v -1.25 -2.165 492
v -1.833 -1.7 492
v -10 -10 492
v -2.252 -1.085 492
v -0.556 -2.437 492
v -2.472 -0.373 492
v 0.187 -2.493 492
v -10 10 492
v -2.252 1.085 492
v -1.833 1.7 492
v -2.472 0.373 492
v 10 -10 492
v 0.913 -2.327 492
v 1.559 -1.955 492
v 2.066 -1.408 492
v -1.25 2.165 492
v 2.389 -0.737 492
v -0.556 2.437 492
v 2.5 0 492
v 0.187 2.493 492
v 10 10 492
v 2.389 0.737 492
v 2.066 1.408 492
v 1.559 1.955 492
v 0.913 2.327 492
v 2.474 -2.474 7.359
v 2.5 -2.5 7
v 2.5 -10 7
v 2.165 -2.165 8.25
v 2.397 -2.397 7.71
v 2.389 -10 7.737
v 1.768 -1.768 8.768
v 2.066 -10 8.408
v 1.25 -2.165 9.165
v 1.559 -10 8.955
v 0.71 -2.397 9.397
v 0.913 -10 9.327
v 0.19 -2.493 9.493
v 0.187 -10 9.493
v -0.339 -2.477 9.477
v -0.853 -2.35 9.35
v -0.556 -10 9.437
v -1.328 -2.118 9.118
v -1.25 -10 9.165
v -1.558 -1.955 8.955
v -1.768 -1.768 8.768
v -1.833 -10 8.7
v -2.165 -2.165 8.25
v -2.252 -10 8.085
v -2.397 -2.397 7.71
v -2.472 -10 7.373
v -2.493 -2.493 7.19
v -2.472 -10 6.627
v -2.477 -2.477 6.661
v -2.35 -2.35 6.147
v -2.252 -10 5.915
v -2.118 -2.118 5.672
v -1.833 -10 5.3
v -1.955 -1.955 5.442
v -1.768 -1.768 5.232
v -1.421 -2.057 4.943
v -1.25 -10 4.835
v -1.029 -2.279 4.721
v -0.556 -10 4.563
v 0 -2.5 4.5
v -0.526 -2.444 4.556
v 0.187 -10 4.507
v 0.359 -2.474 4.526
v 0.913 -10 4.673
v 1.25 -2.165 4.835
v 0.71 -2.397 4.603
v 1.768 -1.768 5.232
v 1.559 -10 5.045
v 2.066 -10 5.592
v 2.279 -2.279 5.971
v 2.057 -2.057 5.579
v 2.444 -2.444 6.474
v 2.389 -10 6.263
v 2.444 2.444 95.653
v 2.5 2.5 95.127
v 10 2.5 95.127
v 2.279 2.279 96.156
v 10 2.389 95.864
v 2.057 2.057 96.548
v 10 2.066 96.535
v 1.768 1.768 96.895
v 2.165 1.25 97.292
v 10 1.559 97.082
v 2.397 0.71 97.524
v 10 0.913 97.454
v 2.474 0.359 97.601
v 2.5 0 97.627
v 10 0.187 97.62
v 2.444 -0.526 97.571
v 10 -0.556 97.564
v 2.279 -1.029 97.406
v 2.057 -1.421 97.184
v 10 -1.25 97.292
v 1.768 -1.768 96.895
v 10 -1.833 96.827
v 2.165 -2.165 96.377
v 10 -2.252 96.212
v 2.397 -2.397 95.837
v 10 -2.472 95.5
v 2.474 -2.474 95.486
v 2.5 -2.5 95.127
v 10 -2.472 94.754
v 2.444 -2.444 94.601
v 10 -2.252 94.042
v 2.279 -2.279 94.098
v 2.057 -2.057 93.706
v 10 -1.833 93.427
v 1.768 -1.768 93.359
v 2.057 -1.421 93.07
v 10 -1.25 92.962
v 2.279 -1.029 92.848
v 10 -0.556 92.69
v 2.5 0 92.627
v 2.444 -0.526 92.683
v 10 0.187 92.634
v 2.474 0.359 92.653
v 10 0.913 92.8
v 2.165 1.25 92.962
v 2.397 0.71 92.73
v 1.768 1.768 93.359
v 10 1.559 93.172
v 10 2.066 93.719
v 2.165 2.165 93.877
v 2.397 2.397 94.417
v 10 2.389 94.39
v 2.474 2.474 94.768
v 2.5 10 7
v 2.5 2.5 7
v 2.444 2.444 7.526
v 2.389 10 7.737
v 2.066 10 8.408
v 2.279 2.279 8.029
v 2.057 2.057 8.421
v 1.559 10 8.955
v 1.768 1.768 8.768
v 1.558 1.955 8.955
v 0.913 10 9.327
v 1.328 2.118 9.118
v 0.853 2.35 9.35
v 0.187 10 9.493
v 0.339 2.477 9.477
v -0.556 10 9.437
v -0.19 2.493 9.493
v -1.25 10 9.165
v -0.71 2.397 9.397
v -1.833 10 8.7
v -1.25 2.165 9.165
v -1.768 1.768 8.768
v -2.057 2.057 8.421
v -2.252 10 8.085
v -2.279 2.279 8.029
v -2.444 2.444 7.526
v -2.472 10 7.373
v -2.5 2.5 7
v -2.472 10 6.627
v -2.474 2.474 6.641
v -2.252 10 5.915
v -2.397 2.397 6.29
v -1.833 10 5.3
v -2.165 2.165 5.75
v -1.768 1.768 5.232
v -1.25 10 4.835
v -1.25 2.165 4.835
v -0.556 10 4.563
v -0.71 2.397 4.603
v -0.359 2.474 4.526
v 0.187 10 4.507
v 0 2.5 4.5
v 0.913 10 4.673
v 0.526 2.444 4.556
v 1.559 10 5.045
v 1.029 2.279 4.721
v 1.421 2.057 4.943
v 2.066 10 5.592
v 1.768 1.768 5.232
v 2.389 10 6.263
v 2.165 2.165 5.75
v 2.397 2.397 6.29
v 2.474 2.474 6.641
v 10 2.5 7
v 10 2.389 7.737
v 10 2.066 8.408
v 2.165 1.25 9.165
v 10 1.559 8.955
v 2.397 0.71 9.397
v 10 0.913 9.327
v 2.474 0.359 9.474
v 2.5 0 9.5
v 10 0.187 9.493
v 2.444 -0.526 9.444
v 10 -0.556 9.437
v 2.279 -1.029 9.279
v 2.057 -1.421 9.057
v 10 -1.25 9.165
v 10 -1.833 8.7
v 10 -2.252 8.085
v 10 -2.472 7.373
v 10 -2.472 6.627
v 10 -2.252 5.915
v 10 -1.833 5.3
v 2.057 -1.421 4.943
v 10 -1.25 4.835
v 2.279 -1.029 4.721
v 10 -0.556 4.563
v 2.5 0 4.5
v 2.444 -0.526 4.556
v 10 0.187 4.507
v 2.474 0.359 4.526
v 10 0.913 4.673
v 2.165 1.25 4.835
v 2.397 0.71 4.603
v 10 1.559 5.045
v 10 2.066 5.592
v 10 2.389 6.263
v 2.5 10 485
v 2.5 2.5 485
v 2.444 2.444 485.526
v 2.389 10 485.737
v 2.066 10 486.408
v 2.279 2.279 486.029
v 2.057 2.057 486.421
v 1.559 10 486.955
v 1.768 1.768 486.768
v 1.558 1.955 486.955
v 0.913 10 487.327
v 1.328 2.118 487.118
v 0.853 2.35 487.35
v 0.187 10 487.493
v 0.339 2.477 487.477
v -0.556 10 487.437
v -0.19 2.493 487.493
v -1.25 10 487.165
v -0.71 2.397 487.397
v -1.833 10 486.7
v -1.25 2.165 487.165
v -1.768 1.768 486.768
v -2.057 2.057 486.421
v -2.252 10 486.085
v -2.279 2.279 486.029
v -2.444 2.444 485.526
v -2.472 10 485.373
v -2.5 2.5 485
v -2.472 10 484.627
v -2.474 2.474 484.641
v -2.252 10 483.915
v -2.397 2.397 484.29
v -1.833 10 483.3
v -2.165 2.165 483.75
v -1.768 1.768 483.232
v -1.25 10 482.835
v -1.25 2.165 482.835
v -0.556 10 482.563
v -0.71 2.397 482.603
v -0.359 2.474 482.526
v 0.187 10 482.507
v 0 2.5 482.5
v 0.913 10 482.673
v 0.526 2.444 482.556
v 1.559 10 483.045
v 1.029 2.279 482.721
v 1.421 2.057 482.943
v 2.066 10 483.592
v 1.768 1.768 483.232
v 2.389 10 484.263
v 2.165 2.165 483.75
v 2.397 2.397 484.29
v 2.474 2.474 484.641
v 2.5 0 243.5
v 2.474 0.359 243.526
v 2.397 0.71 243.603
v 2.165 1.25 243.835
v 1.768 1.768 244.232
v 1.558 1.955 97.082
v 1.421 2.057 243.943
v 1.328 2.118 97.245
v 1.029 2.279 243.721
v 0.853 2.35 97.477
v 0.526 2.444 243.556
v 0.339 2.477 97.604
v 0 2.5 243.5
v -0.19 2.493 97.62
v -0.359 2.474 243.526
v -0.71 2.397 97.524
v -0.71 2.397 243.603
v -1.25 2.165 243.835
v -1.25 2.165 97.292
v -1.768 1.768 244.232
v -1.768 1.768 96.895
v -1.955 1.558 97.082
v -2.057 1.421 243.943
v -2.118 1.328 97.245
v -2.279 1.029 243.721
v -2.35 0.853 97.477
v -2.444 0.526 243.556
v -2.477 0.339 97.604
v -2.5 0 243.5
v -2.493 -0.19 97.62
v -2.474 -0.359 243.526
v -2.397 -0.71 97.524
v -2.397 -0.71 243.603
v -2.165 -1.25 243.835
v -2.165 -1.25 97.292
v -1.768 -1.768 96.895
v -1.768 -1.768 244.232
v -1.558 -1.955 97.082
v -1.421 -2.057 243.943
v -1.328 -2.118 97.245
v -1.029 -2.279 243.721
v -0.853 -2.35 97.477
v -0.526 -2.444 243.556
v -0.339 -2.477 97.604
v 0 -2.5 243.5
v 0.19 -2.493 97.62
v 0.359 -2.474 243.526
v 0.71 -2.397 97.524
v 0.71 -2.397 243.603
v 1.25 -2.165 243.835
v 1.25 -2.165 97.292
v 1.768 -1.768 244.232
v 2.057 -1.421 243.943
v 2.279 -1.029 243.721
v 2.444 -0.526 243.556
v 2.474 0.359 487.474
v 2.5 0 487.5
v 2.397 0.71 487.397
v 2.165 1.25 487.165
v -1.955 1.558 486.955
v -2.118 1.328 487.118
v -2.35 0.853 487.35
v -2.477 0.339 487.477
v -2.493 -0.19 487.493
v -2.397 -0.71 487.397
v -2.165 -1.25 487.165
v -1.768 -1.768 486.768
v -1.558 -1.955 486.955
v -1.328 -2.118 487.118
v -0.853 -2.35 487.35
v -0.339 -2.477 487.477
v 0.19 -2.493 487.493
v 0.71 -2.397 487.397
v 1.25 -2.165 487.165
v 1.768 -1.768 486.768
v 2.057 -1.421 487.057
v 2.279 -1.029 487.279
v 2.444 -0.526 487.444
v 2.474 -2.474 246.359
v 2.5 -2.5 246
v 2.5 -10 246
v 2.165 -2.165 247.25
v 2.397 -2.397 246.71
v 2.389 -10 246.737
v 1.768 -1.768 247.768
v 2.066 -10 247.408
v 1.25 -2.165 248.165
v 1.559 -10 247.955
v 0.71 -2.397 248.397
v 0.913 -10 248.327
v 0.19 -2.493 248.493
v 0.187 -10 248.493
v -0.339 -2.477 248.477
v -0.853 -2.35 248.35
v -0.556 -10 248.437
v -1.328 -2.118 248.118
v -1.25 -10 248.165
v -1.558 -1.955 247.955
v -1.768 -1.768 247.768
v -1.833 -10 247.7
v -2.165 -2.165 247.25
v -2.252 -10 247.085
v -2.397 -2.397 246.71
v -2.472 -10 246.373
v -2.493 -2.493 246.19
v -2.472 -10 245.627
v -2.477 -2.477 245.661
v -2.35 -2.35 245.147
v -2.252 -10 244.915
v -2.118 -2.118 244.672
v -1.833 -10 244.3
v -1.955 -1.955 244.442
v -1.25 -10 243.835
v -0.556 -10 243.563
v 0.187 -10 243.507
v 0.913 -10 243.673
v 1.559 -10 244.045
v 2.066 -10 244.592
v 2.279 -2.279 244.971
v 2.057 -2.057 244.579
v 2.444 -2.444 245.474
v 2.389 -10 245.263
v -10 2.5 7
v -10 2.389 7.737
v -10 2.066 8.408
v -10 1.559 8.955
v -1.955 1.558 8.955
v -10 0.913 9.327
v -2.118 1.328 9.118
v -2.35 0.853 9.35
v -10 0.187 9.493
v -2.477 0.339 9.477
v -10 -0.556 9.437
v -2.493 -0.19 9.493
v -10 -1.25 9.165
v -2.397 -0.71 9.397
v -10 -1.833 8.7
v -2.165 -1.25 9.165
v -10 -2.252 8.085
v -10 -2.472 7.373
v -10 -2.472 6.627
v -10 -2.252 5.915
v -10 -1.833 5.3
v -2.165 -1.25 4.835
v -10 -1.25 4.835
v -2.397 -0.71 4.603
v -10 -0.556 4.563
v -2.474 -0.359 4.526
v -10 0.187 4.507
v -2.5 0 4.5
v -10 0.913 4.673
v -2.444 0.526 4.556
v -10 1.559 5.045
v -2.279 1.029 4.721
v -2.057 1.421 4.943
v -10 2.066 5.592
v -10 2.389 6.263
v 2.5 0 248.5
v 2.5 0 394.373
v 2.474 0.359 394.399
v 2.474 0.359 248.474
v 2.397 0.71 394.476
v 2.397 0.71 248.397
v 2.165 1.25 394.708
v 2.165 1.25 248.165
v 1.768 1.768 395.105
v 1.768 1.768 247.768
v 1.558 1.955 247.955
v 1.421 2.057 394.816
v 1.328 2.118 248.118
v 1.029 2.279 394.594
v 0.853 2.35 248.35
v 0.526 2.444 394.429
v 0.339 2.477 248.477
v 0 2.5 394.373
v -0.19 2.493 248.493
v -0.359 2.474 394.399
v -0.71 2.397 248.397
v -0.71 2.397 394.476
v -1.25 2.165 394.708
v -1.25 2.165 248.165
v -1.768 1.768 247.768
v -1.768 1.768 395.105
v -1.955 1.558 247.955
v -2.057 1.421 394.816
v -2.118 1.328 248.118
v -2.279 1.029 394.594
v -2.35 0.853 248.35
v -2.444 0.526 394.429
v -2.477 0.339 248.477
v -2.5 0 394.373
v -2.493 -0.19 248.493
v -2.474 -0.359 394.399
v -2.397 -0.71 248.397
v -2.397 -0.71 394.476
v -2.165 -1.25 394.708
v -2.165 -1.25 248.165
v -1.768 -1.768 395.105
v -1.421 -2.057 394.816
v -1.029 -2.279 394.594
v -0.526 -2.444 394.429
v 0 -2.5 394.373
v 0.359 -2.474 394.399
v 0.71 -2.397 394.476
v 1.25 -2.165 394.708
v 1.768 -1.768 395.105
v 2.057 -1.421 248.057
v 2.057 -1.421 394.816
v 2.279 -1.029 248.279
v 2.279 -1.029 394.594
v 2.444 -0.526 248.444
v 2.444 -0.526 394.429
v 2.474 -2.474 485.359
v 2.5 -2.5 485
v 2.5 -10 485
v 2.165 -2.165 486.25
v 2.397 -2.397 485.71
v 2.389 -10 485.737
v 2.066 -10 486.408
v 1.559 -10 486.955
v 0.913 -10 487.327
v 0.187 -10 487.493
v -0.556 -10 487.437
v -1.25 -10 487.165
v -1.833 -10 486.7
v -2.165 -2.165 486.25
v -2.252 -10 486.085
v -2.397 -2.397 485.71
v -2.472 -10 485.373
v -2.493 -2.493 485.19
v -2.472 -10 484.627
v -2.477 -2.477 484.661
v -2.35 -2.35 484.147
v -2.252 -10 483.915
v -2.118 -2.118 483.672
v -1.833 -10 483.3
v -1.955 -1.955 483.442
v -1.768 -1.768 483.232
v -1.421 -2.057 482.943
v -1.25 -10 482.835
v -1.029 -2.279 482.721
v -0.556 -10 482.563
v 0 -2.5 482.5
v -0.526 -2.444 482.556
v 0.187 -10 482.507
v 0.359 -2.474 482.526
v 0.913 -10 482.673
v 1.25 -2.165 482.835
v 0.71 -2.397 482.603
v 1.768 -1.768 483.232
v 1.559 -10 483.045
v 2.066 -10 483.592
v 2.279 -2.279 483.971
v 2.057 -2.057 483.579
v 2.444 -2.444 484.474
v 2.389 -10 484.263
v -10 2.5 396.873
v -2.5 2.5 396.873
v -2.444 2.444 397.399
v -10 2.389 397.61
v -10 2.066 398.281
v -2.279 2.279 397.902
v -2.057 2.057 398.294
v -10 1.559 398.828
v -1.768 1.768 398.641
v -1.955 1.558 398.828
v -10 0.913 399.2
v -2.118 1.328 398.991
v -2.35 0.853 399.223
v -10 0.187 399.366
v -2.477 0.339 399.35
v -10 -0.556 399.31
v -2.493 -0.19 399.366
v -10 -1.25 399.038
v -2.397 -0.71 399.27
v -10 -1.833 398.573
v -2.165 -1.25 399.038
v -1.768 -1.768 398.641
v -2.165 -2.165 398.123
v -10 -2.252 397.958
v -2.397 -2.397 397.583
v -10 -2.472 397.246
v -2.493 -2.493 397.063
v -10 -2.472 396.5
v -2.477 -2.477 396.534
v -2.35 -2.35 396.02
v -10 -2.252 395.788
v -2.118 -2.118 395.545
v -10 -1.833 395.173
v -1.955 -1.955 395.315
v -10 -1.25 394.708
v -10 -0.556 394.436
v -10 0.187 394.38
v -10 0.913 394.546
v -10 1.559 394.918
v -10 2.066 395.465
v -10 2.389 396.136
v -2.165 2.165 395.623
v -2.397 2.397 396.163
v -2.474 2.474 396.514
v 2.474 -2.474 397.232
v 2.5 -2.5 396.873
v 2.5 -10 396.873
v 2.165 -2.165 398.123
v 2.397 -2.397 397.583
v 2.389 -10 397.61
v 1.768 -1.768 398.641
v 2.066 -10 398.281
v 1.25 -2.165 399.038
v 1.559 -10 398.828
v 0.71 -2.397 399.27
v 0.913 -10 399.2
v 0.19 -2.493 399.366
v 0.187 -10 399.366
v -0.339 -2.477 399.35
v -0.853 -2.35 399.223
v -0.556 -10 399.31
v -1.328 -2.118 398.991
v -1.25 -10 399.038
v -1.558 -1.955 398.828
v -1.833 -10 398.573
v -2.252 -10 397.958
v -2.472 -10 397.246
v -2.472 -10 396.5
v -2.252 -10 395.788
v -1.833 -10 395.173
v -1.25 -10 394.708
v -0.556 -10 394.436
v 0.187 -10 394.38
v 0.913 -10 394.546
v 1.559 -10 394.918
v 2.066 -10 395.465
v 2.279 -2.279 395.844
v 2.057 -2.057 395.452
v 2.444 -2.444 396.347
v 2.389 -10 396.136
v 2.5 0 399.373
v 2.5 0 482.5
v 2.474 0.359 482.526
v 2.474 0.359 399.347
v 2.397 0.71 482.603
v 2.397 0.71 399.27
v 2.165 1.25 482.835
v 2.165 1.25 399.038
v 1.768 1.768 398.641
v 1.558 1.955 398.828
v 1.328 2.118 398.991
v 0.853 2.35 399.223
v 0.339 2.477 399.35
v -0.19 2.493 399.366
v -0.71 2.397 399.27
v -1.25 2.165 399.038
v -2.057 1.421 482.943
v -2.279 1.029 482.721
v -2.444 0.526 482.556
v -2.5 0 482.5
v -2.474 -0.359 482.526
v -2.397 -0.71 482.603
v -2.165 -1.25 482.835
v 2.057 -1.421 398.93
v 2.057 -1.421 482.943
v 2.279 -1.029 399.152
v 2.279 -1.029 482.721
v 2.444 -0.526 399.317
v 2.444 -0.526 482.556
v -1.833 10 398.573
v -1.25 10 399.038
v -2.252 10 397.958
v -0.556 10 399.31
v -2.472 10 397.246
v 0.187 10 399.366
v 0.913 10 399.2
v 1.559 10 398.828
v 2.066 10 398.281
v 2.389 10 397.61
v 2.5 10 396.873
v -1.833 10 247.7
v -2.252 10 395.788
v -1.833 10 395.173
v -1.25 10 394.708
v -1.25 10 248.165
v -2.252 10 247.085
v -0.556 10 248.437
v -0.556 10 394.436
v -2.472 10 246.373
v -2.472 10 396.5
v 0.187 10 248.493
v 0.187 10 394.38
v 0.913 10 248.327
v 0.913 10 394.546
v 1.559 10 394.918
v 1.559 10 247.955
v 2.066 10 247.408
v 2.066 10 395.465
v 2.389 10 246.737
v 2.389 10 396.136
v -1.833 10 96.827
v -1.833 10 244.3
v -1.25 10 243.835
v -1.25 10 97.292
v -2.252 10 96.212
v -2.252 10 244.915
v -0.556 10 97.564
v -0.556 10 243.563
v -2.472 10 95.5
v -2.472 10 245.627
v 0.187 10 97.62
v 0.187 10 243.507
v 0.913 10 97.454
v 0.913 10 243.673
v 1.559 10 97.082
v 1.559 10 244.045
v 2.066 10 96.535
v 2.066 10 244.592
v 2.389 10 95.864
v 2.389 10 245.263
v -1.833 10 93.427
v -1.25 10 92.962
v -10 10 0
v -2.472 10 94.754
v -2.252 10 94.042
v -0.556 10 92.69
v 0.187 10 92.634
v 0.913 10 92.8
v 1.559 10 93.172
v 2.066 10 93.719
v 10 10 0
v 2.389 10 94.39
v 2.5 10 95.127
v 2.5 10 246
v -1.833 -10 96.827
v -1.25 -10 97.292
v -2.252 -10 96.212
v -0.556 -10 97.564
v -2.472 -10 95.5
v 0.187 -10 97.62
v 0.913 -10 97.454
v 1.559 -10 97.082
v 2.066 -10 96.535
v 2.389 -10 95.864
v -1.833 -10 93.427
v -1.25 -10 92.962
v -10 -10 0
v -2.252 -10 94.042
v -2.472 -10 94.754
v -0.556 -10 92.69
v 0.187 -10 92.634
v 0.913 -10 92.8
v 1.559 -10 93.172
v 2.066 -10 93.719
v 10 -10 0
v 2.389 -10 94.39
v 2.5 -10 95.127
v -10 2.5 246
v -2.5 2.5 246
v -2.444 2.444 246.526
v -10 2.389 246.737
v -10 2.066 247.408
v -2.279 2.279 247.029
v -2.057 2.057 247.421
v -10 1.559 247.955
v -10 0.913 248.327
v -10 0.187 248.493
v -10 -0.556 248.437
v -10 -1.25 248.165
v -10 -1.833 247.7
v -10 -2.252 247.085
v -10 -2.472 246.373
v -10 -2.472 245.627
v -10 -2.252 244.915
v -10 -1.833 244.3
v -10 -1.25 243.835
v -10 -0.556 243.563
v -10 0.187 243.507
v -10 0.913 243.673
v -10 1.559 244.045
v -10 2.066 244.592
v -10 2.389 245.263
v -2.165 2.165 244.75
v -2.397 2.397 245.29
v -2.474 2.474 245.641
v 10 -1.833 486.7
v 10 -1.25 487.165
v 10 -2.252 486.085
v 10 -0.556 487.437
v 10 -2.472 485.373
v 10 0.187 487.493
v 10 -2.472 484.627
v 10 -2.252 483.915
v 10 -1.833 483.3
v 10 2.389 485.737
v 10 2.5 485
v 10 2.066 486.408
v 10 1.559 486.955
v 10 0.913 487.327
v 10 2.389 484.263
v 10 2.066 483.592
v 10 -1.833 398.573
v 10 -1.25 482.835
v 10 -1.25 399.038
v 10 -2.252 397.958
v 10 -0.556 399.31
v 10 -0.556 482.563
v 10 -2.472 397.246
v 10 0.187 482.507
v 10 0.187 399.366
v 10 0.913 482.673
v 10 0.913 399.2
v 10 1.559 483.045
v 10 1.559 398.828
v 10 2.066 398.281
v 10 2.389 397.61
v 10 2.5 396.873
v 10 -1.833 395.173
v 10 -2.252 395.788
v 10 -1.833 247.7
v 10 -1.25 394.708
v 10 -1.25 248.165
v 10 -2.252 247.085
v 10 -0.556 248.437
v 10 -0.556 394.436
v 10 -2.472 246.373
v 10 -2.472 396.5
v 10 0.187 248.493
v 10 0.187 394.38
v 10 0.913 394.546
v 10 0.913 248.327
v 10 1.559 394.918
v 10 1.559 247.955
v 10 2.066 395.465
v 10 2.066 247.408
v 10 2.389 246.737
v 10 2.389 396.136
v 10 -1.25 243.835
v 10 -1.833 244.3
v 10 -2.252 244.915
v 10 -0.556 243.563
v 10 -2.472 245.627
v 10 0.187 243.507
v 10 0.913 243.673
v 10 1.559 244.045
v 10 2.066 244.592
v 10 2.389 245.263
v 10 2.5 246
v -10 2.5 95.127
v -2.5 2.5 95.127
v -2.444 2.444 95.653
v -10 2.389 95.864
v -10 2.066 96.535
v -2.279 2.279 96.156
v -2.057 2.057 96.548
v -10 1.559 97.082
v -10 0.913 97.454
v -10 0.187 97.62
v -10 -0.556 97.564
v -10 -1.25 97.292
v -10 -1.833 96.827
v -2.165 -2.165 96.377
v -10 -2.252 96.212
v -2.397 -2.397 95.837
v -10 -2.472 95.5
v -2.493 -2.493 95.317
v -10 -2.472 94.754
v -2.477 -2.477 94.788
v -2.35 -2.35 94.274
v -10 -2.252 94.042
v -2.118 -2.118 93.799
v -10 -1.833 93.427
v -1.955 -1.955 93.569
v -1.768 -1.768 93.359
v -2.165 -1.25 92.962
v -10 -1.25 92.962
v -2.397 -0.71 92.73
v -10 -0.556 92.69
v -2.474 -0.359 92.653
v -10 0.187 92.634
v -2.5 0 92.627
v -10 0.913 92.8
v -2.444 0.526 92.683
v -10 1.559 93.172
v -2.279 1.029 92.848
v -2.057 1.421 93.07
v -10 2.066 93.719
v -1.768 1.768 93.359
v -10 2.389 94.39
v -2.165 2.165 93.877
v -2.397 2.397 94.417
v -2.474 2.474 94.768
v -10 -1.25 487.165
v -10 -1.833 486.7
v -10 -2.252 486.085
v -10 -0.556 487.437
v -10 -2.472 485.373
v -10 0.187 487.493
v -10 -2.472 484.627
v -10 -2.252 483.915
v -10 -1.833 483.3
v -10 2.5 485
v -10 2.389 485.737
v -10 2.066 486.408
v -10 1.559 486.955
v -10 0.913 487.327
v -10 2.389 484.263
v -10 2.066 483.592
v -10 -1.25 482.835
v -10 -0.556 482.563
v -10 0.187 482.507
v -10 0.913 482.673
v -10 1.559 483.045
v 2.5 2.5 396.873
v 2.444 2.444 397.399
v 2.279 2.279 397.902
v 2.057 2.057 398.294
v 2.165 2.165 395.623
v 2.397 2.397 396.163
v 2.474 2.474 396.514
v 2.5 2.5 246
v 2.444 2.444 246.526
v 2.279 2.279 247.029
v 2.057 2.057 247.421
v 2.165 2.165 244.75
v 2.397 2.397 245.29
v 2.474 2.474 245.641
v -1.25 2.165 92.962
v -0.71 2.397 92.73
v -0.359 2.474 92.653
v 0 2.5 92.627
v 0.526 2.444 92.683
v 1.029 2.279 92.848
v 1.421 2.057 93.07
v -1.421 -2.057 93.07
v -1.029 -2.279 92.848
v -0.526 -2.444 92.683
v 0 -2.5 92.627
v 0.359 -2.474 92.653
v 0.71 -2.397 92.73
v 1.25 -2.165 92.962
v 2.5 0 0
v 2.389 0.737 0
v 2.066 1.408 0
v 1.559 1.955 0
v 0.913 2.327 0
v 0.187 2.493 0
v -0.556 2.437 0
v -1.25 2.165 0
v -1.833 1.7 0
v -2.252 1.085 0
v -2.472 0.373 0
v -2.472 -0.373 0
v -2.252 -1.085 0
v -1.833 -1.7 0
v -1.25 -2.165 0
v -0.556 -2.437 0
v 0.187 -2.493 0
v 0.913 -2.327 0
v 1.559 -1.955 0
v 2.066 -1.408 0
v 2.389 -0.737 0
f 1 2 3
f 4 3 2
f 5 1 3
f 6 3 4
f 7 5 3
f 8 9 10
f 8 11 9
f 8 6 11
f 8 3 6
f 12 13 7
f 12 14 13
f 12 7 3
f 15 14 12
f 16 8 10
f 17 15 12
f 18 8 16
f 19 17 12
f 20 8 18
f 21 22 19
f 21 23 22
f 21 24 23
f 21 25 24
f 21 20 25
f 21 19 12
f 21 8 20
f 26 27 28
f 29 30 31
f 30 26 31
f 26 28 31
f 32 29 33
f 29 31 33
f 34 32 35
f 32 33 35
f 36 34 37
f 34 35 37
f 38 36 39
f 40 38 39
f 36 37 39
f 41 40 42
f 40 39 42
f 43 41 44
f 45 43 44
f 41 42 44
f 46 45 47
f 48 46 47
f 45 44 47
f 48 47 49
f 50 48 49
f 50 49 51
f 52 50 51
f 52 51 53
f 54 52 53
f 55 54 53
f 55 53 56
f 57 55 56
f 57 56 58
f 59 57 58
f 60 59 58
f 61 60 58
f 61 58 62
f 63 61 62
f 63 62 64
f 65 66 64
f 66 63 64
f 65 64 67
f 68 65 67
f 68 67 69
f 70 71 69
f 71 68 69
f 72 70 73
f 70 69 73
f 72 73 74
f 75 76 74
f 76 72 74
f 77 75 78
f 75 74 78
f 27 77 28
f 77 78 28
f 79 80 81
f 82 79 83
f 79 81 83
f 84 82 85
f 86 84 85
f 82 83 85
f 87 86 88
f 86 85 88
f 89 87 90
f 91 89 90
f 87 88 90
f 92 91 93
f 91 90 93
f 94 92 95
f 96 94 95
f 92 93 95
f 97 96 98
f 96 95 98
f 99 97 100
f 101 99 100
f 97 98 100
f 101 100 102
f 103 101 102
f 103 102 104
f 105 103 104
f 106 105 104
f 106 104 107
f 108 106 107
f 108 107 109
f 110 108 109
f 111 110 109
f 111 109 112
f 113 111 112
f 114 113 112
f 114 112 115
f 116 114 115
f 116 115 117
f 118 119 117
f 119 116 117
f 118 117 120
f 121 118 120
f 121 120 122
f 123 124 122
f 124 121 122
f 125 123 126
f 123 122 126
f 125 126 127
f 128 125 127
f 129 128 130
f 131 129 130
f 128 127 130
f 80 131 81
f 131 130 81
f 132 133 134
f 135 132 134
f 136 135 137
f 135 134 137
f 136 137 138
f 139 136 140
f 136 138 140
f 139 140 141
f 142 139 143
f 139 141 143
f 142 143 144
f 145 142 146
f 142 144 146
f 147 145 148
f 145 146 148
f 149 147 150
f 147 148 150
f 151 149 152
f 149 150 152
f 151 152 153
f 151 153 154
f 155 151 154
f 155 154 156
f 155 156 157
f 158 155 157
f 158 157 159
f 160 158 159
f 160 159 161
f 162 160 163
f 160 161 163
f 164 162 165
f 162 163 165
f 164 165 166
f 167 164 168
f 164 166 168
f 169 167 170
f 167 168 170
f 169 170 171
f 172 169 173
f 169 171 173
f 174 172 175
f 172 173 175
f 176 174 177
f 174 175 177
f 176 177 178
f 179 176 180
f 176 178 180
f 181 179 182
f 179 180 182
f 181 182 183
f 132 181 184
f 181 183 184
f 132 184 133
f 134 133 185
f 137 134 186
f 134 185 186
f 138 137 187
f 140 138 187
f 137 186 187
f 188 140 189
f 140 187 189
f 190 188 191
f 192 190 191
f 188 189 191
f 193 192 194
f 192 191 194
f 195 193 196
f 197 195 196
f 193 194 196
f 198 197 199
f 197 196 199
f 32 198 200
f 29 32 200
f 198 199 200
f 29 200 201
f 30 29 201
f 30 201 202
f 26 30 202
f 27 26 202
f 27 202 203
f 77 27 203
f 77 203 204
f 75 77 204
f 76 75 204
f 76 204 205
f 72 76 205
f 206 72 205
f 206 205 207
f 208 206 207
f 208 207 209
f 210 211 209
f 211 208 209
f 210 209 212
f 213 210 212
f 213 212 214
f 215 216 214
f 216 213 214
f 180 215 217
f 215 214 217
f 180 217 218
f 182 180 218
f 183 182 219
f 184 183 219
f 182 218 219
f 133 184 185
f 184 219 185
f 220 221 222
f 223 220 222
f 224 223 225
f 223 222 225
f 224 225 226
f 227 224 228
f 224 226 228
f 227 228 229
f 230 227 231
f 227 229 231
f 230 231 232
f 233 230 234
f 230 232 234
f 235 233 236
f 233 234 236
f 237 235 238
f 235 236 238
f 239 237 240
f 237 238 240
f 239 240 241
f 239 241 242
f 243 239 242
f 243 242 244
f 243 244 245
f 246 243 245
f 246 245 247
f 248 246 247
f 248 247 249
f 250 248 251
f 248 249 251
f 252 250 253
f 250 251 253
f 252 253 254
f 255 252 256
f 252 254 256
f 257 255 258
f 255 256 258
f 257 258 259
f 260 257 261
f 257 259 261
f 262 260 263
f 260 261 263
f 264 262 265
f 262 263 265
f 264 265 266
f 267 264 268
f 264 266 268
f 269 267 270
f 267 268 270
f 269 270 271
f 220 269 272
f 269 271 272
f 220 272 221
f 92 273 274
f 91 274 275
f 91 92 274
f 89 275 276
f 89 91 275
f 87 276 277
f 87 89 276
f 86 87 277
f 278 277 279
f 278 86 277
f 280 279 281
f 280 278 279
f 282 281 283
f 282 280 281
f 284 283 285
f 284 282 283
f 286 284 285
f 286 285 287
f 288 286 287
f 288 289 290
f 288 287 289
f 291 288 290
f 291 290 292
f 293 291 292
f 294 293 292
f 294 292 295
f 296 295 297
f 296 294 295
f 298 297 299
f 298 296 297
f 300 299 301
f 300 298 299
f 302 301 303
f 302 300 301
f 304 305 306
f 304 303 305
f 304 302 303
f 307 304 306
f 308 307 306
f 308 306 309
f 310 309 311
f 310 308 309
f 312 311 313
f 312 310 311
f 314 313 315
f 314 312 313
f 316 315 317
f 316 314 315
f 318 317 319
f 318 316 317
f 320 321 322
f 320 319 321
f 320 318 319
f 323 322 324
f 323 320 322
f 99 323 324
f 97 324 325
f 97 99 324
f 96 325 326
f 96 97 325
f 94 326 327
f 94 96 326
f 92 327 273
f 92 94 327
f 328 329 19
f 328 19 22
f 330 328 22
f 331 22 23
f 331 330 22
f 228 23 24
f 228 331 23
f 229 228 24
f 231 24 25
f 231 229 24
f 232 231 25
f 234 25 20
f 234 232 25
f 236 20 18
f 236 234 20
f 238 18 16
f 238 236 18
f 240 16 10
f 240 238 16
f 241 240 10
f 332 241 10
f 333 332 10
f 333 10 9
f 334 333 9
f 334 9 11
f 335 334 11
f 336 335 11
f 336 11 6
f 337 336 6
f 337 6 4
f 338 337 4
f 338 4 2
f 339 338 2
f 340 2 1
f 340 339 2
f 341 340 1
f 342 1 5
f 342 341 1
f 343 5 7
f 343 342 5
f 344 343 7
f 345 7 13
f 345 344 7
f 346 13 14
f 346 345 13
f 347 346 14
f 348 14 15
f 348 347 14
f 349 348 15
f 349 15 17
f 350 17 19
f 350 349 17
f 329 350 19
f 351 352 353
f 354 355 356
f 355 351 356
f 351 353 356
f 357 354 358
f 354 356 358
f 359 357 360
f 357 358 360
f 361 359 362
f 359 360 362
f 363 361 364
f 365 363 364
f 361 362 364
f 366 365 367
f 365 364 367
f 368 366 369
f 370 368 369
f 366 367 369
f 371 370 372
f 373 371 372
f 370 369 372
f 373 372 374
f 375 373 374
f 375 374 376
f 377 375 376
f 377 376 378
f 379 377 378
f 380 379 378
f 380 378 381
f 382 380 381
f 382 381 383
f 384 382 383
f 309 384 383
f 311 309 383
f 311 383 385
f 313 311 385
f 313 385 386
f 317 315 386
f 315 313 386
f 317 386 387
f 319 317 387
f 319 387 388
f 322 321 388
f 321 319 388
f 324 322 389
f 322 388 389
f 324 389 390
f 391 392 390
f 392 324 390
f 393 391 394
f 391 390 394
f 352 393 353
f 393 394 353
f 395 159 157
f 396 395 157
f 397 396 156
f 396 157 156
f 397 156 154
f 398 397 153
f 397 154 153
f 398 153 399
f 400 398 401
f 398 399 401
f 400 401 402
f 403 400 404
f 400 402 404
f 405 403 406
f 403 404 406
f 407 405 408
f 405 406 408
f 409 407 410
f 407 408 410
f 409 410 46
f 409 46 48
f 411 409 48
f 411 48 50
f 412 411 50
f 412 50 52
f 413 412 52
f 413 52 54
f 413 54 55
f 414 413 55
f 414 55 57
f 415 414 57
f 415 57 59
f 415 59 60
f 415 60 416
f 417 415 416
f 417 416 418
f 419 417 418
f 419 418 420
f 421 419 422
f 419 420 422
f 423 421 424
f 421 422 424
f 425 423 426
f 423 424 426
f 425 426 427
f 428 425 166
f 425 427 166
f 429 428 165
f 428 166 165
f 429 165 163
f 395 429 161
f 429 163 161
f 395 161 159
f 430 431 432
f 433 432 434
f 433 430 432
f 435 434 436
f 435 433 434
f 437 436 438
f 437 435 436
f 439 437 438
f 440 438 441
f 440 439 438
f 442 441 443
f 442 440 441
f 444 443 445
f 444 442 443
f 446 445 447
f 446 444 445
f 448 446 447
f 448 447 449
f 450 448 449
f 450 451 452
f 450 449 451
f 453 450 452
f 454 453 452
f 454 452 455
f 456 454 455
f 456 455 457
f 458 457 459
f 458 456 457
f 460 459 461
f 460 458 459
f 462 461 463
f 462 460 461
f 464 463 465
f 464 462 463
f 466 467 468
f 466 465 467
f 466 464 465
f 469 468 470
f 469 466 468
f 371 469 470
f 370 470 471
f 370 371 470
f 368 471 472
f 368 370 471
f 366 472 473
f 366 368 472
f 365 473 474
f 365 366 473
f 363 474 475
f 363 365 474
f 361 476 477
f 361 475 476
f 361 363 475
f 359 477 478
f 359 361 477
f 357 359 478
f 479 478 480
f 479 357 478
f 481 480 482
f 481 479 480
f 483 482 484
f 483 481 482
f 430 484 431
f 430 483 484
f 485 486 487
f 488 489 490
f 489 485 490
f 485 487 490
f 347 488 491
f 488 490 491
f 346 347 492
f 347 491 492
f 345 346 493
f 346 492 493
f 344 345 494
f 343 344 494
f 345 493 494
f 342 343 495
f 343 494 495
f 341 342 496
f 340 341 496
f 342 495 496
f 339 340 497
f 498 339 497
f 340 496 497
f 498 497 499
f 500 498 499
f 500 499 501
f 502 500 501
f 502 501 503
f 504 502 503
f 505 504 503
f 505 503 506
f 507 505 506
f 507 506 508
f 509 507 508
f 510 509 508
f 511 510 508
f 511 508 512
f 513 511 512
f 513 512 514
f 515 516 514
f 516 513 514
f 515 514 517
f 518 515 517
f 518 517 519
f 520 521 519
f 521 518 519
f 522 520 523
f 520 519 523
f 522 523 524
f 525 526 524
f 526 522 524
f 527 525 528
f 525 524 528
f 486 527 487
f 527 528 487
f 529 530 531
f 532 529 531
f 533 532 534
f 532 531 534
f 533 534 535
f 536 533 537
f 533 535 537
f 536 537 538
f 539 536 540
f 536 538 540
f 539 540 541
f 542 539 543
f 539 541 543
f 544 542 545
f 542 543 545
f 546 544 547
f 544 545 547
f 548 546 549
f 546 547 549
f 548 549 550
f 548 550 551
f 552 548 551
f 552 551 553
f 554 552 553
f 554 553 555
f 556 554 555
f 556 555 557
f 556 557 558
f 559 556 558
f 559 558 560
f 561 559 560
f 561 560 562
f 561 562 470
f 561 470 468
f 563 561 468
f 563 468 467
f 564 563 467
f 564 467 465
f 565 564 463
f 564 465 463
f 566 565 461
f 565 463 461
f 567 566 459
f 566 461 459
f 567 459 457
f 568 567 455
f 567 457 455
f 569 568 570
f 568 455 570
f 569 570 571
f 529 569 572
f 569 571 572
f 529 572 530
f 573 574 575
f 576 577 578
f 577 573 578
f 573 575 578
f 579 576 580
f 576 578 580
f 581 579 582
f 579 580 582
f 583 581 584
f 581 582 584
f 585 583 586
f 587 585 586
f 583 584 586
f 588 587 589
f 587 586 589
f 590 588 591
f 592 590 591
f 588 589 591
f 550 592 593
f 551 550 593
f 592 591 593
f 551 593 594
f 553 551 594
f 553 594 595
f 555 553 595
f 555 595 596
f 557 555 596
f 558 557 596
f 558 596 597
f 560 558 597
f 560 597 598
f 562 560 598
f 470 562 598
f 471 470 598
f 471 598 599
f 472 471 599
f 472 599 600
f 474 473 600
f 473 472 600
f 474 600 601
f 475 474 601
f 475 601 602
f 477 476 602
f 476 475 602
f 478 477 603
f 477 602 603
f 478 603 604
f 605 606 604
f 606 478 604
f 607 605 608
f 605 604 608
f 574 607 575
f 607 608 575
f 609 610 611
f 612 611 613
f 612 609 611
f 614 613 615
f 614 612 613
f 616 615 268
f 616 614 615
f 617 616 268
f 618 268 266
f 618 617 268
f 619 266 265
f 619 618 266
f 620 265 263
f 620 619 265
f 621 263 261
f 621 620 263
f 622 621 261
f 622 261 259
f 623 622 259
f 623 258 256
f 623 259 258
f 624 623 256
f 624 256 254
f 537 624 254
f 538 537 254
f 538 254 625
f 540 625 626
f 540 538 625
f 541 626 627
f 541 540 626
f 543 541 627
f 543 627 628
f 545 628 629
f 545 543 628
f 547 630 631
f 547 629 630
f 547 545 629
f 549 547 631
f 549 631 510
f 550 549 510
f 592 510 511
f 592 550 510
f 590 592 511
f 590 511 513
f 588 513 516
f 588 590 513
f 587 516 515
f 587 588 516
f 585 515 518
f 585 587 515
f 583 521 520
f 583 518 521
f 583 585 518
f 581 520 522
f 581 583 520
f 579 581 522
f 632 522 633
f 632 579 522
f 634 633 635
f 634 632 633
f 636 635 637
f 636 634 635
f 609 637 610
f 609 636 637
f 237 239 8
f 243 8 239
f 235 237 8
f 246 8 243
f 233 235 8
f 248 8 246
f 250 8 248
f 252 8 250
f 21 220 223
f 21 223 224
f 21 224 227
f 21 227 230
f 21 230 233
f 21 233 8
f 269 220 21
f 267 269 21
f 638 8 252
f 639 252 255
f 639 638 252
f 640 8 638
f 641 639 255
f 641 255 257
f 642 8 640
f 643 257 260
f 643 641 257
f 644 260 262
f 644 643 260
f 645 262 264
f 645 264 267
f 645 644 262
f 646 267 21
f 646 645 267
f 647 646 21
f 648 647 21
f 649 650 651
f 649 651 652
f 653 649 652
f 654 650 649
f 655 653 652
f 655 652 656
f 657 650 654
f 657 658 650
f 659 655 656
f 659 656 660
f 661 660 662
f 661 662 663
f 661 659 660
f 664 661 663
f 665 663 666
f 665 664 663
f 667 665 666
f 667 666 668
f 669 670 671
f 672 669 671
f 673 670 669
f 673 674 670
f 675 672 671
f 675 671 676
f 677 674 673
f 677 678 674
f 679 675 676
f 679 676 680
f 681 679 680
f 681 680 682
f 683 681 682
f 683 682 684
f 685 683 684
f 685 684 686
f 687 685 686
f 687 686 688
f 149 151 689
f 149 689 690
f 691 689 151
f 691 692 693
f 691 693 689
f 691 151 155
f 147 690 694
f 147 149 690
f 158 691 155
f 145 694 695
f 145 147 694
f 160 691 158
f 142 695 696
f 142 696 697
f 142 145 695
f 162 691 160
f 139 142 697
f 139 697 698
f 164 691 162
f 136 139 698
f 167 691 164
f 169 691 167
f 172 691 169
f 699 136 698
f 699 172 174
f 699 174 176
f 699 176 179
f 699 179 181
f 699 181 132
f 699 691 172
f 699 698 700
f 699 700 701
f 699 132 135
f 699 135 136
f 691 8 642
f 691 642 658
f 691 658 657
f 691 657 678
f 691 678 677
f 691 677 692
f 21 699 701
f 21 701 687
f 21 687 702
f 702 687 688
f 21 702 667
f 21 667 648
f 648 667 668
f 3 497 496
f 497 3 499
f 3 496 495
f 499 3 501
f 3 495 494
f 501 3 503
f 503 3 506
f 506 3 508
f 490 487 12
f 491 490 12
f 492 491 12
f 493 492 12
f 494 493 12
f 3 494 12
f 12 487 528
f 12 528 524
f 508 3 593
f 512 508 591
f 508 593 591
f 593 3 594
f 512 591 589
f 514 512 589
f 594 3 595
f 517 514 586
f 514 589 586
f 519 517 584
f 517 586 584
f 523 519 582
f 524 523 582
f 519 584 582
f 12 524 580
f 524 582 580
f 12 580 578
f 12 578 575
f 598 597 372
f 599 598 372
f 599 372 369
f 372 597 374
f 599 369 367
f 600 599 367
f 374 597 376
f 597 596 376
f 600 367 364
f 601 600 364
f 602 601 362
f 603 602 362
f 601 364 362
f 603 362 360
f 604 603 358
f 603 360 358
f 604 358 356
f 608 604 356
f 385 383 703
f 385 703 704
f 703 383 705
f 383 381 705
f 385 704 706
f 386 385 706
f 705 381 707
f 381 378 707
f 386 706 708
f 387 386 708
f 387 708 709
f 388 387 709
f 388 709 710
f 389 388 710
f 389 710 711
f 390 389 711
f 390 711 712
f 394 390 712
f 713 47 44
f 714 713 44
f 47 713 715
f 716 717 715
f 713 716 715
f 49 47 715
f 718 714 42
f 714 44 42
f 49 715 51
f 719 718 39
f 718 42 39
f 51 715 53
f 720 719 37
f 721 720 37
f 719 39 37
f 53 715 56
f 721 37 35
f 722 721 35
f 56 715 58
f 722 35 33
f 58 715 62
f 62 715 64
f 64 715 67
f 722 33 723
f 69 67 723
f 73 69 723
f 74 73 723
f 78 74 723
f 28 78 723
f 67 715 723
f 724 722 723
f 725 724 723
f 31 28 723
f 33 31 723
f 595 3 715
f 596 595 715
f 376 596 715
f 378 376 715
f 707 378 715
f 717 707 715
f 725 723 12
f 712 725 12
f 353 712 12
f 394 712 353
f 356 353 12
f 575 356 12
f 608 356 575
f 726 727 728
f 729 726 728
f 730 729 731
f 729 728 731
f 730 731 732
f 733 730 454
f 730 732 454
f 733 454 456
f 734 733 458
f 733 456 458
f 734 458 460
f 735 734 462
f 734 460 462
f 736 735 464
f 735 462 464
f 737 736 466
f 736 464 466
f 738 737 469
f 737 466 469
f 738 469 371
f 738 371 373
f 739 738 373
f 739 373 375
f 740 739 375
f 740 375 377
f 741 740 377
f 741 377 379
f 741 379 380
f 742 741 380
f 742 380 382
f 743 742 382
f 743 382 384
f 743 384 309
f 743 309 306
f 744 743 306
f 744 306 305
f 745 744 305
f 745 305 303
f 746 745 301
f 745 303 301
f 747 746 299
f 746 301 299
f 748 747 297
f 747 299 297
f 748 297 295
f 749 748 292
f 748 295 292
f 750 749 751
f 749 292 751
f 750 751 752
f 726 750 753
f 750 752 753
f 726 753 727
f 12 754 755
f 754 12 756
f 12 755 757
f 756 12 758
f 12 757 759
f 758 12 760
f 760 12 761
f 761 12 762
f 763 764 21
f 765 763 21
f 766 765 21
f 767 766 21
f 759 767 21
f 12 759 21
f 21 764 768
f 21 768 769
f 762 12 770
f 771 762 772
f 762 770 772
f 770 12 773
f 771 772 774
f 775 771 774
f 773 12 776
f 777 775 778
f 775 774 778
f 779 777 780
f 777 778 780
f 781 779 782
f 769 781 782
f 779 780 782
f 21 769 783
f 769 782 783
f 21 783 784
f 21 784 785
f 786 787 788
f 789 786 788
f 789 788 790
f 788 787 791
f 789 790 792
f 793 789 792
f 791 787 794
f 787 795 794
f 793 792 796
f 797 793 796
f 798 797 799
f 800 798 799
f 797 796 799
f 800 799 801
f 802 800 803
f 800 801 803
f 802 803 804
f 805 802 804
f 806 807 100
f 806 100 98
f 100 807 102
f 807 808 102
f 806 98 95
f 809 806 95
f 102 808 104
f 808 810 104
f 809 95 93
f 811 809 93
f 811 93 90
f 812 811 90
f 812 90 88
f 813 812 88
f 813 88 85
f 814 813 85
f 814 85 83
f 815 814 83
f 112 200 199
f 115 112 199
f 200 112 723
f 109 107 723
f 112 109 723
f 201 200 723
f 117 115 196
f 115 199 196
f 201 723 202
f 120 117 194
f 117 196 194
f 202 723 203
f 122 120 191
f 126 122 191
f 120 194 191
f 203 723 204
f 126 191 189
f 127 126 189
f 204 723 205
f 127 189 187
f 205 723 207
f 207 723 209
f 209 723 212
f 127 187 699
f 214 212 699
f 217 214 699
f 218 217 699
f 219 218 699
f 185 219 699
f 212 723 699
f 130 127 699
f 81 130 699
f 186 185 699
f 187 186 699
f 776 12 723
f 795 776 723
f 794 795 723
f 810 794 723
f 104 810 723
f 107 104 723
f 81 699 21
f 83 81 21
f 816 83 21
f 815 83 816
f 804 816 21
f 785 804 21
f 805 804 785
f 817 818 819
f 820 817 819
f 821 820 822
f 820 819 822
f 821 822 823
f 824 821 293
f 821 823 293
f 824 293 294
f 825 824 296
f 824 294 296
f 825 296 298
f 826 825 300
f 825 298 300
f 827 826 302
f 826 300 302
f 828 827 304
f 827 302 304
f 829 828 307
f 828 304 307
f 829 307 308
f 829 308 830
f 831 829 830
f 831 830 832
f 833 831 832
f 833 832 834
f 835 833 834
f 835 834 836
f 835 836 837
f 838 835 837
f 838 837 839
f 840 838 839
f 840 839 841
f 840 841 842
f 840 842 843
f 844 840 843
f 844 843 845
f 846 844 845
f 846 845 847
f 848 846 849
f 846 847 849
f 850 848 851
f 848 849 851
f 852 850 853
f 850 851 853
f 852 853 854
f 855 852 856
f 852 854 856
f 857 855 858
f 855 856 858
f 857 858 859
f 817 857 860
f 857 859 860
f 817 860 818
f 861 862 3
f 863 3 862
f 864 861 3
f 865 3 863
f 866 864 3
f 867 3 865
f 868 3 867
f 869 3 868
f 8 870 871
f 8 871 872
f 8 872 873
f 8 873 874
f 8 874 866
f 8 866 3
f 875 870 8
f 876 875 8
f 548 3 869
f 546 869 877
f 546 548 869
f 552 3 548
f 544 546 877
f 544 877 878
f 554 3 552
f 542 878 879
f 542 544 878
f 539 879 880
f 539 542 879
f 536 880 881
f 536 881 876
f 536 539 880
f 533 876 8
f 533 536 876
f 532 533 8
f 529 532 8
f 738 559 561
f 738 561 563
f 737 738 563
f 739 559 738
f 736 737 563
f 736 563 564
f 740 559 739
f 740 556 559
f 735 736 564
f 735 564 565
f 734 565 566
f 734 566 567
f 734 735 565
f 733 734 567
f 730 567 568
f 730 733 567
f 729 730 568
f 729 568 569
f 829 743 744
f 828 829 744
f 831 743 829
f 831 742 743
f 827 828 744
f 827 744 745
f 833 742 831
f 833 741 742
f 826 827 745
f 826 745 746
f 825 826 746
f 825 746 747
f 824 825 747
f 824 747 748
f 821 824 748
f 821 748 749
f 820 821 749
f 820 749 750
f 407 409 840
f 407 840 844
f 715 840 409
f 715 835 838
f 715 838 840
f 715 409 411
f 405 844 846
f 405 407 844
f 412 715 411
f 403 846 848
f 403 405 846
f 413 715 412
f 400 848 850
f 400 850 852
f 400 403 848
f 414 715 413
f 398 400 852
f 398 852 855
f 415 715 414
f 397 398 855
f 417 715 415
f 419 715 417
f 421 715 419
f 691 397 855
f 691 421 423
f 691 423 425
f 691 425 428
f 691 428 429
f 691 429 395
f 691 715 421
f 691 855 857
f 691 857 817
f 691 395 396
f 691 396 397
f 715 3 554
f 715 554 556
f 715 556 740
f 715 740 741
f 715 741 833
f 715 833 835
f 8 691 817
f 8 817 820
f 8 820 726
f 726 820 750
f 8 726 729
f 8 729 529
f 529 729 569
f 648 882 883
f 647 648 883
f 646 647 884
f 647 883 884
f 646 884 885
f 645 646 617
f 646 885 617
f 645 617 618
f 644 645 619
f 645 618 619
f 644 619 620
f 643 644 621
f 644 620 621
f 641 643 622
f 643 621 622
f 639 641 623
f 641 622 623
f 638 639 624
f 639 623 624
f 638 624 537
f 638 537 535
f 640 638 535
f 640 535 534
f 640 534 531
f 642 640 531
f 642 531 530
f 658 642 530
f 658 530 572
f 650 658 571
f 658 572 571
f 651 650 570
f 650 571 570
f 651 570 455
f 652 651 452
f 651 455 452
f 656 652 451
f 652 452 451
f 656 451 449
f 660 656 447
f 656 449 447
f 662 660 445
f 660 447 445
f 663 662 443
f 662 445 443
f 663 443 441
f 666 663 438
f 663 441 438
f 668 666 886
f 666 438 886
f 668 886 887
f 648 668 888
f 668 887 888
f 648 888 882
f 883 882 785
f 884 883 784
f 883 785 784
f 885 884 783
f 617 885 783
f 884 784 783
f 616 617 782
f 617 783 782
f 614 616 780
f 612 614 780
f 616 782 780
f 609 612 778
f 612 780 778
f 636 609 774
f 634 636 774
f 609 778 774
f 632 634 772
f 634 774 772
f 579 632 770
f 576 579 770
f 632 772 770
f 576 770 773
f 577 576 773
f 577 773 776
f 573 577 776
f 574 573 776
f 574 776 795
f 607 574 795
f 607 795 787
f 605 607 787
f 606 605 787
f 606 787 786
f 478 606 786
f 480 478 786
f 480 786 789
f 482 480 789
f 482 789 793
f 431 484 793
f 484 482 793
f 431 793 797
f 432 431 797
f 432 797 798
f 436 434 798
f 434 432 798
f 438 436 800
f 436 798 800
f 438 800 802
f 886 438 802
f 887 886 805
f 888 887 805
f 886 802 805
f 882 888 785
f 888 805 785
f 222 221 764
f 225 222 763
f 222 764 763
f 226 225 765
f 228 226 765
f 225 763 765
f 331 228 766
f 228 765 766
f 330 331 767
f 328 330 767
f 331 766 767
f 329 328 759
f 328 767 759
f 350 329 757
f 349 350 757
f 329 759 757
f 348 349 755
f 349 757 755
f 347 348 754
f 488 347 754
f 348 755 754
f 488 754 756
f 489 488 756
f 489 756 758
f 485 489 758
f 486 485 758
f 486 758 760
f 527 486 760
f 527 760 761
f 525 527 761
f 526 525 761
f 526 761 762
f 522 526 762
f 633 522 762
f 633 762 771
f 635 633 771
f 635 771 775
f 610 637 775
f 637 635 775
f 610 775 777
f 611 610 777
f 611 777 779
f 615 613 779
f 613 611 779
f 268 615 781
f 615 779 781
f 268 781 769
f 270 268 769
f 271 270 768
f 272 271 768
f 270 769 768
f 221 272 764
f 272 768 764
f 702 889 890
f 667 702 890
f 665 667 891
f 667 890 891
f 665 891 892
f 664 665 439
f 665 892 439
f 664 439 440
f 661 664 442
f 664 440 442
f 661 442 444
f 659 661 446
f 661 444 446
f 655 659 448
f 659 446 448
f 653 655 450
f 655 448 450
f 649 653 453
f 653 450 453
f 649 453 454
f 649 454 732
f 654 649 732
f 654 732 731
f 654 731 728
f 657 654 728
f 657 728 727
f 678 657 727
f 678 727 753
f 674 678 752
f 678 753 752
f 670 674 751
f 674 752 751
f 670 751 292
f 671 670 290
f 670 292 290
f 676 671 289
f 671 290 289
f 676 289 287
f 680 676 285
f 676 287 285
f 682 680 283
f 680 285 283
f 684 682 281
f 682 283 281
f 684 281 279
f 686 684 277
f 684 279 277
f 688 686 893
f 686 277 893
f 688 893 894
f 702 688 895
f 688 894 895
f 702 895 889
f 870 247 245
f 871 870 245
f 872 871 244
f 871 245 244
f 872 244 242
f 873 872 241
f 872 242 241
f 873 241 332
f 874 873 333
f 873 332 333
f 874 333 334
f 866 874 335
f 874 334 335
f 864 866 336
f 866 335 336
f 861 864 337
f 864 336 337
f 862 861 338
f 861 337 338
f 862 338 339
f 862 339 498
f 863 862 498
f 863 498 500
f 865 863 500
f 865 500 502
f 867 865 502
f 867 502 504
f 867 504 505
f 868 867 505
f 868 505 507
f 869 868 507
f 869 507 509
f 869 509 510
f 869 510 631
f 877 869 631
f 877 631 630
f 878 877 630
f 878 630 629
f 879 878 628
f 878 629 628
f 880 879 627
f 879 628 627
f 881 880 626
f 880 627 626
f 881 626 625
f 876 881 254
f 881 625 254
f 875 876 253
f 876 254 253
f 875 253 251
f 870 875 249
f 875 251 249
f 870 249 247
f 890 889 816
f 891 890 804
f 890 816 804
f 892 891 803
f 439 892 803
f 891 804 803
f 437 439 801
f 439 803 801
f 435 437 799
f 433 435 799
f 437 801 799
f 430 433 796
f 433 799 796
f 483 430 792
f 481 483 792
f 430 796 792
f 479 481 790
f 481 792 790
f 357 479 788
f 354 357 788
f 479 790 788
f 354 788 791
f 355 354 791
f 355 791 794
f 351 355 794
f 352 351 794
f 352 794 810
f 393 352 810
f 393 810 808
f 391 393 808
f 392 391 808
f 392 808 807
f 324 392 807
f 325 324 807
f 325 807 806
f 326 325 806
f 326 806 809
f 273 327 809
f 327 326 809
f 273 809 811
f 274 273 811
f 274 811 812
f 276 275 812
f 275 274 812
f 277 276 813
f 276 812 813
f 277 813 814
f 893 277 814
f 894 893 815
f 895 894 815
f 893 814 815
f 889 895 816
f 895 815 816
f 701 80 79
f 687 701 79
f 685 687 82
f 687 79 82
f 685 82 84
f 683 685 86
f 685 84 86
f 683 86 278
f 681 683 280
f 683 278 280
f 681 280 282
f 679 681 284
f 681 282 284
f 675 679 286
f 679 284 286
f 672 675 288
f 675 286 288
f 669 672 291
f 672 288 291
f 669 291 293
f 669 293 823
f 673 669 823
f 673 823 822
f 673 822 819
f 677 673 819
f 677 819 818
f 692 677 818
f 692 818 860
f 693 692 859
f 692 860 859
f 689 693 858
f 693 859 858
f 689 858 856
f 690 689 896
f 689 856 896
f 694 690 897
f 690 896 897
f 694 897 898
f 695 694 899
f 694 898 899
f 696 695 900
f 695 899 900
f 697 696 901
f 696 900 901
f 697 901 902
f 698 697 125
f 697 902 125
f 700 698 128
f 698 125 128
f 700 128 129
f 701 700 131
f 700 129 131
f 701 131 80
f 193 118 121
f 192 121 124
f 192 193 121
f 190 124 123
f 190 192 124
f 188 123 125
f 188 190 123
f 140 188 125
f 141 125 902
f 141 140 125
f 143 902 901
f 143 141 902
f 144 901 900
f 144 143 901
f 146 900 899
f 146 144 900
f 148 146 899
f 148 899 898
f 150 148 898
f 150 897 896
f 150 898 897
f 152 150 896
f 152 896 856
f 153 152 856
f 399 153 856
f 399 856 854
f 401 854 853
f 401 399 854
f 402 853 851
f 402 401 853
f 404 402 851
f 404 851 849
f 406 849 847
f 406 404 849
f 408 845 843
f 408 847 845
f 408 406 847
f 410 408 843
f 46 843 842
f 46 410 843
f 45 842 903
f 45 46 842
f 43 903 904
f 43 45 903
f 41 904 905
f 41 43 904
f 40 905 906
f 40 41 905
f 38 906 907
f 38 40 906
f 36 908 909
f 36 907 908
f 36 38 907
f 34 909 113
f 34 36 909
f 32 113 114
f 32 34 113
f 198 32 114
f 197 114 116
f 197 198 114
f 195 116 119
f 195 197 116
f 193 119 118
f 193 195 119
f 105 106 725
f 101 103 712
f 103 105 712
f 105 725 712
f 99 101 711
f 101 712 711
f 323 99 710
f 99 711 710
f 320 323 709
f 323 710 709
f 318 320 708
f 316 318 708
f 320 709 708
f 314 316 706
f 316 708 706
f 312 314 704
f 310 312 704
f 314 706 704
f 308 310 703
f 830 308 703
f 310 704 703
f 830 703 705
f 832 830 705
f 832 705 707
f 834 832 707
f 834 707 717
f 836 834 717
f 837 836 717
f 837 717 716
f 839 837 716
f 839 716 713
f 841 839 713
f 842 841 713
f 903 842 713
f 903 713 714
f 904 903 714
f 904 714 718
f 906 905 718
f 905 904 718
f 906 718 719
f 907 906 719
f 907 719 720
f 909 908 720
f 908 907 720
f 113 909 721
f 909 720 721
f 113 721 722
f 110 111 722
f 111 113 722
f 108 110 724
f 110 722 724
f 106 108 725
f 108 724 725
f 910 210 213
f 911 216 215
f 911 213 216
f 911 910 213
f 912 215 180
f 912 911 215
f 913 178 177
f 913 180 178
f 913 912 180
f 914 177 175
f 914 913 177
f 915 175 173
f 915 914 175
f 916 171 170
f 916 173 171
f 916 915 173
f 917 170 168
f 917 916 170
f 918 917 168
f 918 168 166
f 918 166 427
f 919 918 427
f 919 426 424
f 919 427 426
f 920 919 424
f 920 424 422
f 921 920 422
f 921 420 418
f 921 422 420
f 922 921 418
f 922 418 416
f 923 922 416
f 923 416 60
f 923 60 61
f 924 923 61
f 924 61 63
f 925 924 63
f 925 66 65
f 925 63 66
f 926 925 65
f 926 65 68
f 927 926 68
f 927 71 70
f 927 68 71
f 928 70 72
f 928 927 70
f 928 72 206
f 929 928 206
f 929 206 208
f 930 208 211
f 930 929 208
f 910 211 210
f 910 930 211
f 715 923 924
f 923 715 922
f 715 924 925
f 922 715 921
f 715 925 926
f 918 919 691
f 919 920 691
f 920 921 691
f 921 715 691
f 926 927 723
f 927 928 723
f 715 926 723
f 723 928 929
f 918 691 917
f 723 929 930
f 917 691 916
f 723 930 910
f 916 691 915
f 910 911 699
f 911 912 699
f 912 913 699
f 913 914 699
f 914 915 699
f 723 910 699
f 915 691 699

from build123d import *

# Parameters (mm, degrees)
F0_W     = 20
F0_H     = 20
F0_R     = 2.5
F1_DEPTH = 492
F2_R     = 2.5
F3_DEPTH = 20.001
F4_R     = 2.5
F5_DEPTH = 20.001


with BuildPart() as f1:
    # F0 (on Top) → F1 (new body)
    with BuildSketch(Plane.XY):
        Rectangle(F0_W, F0_H)
        Circle(F0_R, mode=Mode.SUBTRACT)
    extrude(amount=F1_DEPTH)

    # F2 (on face) → F3 (cut, through all)
    with BuildSketch(Plane.YZ.offset(10)):
        with Locations((0, 7)):
            Circle(F2_R)
        with Locations((0, 485)):
            Circle(F2_R)
        with Locations((0, 246)):
            Circle(F2_R)
        with Locations((0, 95.127)):
            Circle(F2_R)
        with Locations((0, 396.873)):
            Circle(F2_R)
    extrude(amount=-F3_DEPTH, mode=Mode.SUBTRACT)

    # F4 (on face) → F5 (cut, through all)
    with BuildSketch(Plane.XZ.offset(10)):
        with Locations((0, 246)):
            Circle(F4_R)
        with Locations((0, 485)):
            Circle(F4_R)
        with Locations((0, 7)):
            Circle(F4_R)
        with Locations((0, 95.127)):
            Circle(F4_R)
        with Locations((0, 396.873)):
            Circle(F4_R)
    extrude(amount=-F5_DEPTH, mode=Mode.SUBTRACT)


solid = f1.part
